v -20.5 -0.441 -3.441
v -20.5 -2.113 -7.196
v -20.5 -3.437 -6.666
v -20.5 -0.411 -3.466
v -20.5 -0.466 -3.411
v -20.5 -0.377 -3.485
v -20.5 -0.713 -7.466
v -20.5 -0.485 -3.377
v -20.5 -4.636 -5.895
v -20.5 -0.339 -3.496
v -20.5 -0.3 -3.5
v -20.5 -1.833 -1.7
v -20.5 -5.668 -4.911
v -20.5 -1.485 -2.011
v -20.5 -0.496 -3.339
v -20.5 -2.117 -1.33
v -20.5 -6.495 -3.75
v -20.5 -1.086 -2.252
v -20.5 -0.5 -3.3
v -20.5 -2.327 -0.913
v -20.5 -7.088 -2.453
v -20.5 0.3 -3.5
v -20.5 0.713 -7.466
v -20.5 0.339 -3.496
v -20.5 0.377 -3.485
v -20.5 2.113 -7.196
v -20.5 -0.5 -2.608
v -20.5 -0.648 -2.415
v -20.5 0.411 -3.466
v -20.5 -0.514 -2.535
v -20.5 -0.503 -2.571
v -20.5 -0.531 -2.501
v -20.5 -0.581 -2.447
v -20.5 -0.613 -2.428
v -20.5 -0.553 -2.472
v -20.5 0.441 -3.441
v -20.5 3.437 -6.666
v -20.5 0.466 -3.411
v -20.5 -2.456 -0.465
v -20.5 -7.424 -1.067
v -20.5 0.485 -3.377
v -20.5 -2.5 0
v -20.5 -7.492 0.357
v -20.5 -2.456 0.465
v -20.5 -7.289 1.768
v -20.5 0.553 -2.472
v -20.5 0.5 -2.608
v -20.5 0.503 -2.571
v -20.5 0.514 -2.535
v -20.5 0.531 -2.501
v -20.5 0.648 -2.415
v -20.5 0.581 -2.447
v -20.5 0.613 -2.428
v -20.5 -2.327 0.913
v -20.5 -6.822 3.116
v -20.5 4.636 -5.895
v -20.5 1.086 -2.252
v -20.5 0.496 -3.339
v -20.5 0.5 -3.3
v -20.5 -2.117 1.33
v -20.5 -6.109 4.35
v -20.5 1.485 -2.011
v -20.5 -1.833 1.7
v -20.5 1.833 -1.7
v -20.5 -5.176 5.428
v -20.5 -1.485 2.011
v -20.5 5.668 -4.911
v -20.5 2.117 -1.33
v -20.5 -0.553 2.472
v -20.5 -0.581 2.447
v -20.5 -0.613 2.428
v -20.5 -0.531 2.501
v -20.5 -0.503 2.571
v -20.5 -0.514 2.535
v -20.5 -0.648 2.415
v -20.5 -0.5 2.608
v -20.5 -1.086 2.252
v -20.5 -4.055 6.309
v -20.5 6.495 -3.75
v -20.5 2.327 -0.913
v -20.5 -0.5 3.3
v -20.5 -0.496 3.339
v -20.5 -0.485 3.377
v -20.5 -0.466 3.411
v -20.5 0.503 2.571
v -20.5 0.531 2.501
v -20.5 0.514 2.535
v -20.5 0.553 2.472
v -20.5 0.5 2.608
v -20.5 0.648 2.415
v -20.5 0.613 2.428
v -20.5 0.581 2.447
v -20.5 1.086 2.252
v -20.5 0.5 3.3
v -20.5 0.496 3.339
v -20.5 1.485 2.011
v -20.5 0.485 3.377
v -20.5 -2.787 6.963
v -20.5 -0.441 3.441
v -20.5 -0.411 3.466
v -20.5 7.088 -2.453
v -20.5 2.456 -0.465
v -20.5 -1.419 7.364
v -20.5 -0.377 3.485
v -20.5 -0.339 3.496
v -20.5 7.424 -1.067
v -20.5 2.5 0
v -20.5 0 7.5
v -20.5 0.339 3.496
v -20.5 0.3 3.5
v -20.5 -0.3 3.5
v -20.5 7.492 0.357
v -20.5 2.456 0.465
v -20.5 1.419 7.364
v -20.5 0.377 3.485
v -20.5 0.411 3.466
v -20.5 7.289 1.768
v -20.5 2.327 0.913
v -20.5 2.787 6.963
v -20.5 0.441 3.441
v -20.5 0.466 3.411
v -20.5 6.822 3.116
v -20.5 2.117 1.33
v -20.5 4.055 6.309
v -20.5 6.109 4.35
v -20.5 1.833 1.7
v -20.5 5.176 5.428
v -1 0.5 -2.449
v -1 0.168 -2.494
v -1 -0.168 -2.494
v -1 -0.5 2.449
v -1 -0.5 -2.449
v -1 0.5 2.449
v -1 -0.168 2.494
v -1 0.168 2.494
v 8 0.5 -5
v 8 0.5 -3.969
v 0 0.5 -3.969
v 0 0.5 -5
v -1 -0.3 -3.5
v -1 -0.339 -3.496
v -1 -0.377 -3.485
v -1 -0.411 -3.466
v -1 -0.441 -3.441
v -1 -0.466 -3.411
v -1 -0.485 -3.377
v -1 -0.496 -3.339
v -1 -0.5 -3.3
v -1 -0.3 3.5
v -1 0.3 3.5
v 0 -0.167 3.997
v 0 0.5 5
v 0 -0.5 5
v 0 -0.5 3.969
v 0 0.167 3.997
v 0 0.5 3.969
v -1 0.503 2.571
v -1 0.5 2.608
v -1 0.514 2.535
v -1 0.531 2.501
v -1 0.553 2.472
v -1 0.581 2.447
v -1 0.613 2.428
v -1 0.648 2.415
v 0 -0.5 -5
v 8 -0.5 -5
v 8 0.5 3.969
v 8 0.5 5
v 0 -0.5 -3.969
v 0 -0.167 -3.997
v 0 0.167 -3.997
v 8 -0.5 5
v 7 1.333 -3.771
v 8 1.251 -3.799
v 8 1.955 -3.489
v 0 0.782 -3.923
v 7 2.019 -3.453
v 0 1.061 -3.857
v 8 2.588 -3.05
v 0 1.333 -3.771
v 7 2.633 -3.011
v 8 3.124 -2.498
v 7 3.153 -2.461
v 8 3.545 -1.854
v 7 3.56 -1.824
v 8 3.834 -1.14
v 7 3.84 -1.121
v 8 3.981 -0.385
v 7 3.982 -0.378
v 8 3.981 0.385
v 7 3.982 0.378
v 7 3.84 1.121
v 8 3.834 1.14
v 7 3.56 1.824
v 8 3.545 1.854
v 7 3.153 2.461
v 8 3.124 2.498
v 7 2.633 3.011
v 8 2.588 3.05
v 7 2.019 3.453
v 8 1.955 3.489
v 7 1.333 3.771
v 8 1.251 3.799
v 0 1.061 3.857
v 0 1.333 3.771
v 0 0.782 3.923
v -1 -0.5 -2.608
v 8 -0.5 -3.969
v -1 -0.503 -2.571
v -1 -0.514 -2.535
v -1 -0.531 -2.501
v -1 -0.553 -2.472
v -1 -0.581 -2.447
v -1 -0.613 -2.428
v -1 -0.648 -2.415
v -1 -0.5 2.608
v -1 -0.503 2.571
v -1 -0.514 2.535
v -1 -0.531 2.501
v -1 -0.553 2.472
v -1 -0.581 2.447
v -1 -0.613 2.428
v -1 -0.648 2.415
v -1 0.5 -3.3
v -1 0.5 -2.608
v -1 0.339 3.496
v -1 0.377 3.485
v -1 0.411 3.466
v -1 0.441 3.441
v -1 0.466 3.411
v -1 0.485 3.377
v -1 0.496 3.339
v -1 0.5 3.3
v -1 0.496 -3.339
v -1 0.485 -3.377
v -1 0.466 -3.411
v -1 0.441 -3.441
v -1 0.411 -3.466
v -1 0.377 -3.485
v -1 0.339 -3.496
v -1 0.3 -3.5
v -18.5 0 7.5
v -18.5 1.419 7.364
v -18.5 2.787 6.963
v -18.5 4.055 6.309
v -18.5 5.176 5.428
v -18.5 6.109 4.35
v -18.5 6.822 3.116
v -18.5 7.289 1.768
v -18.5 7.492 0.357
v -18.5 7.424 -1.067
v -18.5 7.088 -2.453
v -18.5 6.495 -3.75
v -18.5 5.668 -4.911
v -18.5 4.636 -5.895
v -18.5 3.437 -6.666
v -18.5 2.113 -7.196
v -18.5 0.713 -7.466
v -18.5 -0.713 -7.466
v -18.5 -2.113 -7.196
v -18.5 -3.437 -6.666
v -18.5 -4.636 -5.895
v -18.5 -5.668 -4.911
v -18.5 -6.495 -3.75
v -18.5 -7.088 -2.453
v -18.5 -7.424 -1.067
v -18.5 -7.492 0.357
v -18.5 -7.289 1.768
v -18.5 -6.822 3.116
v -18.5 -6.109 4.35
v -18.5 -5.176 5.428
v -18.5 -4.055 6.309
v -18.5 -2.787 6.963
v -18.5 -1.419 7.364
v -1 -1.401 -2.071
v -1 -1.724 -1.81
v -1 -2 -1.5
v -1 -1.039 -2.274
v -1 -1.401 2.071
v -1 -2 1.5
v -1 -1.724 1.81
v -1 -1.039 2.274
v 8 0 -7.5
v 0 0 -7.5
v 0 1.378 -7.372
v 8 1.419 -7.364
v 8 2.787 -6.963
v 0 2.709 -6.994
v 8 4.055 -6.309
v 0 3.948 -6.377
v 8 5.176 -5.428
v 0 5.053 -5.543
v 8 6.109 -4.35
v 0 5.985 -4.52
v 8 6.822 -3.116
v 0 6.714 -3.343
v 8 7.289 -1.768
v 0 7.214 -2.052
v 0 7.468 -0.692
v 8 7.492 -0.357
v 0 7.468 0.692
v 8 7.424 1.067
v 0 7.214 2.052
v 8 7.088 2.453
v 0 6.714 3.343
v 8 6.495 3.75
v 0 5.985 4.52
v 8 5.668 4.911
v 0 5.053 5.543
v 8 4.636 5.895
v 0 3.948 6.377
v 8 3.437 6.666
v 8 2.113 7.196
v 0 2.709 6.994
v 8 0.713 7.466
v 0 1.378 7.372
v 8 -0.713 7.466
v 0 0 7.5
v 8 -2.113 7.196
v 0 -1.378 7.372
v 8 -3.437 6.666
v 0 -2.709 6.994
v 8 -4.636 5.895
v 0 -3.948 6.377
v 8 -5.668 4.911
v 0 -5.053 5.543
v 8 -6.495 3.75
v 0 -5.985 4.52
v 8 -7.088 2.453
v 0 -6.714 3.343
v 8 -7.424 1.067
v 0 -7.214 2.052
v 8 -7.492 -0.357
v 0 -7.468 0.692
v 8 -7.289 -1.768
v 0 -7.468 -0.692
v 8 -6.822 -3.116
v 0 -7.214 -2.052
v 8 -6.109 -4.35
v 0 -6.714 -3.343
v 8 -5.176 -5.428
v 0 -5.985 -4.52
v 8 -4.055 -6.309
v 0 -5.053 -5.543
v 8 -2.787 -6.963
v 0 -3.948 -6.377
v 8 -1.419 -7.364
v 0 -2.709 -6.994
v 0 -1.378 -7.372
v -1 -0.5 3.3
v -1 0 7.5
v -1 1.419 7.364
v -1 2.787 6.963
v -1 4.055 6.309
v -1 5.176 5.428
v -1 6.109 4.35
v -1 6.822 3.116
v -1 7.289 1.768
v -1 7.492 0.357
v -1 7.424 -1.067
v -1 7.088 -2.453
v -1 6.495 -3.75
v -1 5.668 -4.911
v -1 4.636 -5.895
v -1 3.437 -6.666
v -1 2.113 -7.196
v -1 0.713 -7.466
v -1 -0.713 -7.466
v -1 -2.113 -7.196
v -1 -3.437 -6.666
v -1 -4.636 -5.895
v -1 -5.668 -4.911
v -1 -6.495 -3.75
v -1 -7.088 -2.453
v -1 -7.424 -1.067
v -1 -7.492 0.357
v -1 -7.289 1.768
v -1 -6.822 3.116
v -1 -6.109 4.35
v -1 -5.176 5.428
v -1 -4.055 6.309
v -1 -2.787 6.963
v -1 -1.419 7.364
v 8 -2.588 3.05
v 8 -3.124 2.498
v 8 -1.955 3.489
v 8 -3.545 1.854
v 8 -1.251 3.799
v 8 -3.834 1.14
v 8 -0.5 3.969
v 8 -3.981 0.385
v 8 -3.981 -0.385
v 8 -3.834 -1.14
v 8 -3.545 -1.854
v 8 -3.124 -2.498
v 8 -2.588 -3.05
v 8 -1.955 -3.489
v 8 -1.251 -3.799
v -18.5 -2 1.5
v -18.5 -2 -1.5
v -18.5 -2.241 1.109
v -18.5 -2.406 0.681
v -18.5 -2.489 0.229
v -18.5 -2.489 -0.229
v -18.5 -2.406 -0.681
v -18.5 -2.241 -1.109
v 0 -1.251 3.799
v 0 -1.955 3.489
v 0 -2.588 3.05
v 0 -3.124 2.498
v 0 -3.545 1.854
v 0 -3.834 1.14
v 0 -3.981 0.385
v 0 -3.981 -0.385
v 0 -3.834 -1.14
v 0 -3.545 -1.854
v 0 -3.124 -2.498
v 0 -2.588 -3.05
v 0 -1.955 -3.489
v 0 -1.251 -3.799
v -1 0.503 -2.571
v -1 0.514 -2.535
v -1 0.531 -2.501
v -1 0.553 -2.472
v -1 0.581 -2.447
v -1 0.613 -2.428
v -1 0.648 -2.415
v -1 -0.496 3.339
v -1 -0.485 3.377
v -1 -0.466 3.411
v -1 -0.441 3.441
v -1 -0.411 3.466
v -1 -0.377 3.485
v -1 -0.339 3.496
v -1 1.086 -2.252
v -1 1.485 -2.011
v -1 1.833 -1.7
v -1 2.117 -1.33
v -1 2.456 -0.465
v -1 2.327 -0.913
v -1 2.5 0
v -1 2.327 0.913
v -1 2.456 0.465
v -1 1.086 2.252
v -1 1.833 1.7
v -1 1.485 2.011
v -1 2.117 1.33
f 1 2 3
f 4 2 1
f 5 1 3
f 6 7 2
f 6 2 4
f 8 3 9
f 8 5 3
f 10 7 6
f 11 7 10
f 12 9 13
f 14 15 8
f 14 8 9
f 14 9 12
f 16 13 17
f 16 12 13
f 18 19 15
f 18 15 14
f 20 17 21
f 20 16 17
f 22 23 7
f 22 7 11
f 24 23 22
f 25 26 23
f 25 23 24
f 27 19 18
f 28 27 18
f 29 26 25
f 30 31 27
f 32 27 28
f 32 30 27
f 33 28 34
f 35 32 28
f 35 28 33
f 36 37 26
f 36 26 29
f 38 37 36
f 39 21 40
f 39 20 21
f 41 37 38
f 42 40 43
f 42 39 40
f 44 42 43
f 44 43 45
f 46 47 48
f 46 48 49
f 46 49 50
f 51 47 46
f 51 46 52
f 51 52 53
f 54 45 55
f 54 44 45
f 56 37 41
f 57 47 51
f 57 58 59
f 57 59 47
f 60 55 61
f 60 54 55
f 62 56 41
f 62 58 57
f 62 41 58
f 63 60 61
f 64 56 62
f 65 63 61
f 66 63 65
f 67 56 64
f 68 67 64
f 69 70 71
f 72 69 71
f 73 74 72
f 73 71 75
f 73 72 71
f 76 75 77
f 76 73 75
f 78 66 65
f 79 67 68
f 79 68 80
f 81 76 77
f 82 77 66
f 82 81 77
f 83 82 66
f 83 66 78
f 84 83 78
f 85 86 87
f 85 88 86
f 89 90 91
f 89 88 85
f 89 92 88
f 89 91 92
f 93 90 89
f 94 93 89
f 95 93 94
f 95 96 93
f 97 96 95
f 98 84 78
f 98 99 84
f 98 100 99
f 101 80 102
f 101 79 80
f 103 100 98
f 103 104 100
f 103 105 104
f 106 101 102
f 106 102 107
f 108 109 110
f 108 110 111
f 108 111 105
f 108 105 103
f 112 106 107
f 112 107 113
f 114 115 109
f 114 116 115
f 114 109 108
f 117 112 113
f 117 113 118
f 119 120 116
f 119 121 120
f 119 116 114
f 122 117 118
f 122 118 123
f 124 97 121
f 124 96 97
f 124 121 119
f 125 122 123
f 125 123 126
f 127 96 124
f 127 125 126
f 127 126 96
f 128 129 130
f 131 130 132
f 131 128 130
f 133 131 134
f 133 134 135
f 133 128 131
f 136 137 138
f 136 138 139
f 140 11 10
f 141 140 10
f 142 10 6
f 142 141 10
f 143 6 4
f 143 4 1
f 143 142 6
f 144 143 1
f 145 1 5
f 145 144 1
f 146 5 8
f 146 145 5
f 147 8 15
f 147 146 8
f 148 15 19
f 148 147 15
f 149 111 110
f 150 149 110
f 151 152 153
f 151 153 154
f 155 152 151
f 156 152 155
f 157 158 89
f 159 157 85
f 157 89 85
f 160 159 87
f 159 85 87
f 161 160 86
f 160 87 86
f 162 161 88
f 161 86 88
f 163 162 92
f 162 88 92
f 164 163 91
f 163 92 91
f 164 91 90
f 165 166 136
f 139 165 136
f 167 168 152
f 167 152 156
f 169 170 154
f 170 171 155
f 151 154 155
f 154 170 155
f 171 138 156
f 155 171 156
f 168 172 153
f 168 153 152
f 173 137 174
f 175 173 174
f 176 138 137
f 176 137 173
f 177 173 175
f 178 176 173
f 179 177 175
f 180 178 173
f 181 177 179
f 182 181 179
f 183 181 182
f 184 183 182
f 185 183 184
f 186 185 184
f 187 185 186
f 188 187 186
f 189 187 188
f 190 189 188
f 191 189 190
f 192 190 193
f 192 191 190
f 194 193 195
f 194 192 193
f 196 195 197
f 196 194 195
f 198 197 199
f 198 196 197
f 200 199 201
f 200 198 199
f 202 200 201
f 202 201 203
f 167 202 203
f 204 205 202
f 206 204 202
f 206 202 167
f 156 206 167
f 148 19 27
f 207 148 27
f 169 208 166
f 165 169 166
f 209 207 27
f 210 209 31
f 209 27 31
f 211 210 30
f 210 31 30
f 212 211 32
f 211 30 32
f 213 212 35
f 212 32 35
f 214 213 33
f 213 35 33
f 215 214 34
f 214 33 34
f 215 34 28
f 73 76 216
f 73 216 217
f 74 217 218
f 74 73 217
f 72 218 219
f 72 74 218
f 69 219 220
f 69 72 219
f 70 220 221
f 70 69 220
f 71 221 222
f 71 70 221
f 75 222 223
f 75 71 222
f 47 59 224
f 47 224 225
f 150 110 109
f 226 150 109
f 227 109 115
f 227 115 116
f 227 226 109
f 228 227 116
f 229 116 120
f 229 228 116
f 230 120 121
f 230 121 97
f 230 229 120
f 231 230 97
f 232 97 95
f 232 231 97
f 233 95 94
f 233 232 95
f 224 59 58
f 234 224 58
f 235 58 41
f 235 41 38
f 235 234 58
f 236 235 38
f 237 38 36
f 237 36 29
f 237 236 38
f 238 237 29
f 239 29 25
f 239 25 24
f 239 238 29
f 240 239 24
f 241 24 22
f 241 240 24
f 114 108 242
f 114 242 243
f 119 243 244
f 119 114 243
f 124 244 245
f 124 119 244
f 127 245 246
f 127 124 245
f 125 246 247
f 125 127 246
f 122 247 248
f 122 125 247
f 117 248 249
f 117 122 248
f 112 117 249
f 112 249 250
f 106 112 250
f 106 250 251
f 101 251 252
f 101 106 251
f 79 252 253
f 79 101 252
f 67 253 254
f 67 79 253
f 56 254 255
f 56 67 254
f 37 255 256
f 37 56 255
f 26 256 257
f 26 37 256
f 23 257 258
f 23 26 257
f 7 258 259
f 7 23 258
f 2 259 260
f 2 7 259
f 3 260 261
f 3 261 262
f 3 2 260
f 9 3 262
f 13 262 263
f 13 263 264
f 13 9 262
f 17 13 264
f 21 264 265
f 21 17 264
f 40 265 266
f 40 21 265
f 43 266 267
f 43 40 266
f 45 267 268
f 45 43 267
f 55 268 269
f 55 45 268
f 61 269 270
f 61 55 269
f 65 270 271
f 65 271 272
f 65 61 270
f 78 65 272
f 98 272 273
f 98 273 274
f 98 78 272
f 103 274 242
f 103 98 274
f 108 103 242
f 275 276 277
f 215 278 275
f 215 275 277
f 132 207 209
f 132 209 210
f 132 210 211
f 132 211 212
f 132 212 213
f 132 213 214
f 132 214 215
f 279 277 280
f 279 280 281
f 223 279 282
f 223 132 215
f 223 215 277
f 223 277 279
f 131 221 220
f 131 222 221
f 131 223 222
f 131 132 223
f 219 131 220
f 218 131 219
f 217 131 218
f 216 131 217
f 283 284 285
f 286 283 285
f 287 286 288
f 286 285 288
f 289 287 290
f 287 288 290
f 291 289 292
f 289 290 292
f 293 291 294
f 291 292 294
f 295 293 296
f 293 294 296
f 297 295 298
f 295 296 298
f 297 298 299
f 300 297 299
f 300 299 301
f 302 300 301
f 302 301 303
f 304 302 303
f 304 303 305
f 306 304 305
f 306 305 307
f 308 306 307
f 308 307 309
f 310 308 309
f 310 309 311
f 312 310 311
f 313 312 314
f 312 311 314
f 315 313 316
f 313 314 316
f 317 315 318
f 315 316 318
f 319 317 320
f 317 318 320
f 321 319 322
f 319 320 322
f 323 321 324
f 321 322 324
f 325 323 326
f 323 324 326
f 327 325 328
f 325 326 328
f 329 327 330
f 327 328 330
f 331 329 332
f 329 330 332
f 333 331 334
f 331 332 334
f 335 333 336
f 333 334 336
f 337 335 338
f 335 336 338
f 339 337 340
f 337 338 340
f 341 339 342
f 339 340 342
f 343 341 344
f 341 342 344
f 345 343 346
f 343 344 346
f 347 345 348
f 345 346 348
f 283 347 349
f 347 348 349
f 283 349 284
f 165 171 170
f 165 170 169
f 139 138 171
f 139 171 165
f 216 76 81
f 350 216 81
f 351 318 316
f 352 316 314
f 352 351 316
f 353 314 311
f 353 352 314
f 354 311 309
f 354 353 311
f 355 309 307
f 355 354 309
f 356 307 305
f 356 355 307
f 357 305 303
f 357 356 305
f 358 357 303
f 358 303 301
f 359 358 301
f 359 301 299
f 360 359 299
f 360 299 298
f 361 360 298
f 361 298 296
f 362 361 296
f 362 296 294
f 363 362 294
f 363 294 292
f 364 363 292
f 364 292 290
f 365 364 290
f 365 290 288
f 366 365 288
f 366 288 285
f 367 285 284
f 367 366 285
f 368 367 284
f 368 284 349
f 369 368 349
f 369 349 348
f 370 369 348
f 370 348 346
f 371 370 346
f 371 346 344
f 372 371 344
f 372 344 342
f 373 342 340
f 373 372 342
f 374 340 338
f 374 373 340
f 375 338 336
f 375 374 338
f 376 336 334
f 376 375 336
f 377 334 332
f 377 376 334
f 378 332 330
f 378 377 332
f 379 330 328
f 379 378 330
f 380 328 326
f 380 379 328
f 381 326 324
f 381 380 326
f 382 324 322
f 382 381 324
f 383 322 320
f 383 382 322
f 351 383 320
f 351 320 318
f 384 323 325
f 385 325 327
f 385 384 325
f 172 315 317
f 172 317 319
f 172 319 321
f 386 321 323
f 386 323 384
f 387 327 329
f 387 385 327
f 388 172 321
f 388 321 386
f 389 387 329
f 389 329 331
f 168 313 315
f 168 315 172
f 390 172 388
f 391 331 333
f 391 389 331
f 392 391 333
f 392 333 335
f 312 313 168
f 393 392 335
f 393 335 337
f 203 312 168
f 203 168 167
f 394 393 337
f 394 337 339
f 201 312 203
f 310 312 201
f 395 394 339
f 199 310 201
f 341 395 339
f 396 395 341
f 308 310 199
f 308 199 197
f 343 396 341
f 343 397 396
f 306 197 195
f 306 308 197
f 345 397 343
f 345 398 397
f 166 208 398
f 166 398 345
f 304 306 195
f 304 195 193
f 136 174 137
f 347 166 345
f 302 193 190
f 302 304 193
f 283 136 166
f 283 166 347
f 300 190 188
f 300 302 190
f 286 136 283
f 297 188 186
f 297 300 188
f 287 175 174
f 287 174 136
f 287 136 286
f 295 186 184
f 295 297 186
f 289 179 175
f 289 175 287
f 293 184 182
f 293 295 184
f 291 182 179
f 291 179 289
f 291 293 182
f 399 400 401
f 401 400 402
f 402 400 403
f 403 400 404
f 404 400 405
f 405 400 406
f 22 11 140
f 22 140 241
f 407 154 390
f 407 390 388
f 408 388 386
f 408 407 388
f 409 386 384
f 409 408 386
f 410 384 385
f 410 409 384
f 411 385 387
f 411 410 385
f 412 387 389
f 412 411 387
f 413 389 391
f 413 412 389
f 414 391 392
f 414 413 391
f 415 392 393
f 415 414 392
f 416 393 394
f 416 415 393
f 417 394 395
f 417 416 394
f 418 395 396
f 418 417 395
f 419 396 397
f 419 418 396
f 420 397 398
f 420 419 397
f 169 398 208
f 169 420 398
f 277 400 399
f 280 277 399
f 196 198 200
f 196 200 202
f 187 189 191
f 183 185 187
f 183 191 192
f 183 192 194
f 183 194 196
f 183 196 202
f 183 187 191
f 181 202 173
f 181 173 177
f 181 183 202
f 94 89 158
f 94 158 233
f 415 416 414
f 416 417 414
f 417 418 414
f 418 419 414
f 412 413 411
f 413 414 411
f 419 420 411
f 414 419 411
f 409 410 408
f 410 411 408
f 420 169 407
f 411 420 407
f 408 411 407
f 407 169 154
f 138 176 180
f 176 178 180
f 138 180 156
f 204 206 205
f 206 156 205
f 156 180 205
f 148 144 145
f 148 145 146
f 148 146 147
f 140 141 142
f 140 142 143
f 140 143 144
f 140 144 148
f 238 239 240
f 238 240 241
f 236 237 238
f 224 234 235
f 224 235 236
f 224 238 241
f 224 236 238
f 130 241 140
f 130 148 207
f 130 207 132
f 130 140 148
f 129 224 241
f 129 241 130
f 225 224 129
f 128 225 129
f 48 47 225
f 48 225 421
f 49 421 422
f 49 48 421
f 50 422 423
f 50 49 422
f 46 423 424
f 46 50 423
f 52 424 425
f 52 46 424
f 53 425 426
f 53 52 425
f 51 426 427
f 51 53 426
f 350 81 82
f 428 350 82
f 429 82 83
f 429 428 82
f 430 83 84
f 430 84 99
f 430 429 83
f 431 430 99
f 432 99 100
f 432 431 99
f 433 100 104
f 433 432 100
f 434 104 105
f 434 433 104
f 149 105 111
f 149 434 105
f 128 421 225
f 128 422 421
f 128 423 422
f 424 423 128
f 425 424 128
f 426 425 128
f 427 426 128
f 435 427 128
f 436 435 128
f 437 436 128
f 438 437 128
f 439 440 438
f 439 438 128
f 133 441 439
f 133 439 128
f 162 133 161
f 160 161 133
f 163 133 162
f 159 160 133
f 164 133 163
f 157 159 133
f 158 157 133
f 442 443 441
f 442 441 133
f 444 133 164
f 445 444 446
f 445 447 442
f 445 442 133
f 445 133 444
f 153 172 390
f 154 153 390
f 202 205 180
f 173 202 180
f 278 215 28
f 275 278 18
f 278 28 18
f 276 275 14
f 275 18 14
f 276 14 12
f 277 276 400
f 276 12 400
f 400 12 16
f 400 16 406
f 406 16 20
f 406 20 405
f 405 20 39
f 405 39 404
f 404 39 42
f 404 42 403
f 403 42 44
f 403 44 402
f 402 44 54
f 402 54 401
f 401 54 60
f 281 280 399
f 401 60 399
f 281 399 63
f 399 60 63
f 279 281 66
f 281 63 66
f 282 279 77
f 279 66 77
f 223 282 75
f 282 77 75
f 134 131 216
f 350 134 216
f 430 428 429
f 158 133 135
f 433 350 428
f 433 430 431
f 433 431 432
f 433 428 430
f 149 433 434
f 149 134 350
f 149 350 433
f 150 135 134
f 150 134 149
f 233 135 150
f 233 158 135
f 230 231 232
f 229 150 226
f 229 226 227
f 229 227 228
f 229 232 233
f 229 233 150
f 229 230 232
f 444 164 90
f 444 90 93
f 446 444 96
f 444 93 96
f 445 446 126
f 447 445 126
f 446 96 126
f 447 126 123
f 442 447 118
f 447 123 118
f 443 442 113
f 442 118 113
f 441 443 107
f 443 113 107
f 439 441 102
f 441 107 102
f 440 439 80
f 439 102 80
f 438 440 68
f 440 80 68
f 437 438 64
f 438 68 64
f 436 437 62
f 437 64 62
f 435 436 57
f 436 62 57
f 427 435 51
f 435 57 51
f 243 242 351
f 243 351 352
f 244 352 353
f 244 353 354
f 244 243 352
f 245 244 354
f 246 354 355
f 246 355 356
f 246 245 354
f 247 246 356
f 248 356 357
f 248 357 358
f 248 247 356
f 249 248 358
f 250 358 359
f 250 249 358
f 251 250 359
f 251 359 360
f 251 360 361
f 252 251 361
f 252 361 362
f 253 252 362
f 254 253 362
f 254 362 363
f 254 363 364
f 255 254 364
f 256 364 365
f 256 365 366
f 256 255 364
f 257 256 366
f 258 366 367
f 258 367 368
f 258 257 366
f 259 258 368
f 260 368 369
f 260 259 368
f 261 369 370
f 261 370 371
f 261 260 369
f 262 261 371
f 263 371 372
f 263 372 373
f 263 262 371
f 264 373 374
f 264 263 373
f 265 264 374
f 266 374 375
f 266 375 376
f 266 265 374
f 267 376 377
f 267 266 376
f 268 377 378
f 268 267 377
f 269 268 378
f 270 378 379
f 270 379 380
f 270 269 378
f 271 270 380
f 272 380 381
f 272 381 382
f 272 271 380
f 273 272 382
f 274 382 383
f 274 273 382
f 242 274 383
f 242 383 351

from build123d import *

# Parameters (mm, degrees)
SKETCH1_R           = 7.5
SKETCH1_R_2         = 4
BOSS_EXTRUDE1_DEPTH = 8
BOSS_EXTRUDE2_START = 1
SKETCH2_R           = 7.5
BOSS_EXTRUDE2_DEPTH = 1
BOSS_EXTRUDE3_DEPTH = 7
BOSS_EXTRUDE4_START = 17.5
SKETCH4_R           = 7.5
BOSS_EXTRUDE4_DEPTH = 17.5
BOSS_EXTRUDE5_START = 2
SKETCH5_R           = 7.5
SKETCH5_R_2         = 2.5
BOSS_EXTRUDE5_DEPTH = 2
SKETCH6_W           = 7
SKETCH6_H           = 1
CUT_EXTRUDE1_DEPTH  = 19.5
FILLET1_R           = 0.2
SKETCH7_W           = 10
SKETCH7_H           = 1
CUT_EXTRUDE2_DEPTH  = 8


with BuildPart() as part:
    # Sketch1 → Boss-Extrude1 (new body)
    with BuildSketch(Plane(origin=(0, 0, 0), x_dir=(0, 0, -1), z_dir=(1, 0, 0))):
        Circle(SKETCH1_R)
        Circle(SKETCH1_R_2, mode=Mode.SUBTRACT)
    extrude(amount=BOSS_EXTRUDE1_DEPTH)

    # Sketch2 → Boss-Extrude2 (add)
    with BuildSketch(Plane.ZY.offset(BOSS_EXTRUDE2_START)):
        Circle(SKETCH2_R)
    extrude(amount=-BOSS_EXTRUDE2_DEPTH)

    # Sketch3 → Boss-Extrude3 (add)
    with BuildSketch(Plane(origin=(0, 0, 0), x_dir=(0, 0, -1), z_dir=(1, 0, 0))):
        with BuildLine():
            Line((-3.771236166, 1.333333333), (3.771236166, 1.333333333))
            ThreePointArc((3.771236166, 1.333333333), (0, 4), (-3.771236166, 1.333333333))
        make_face()
    extrude(amount=BOSS_EXTRUDE3_DEPTH)

    # Sketch4 → Boss-Extrude4 (add)
    with BuildSketch(Plane.ZY.offset(1).offset(BOSS_EXTRUDE4_START)):
        Circle(SKETCH4_R)
        with BuildLine():
            ThreePointArc((1.5, -2), (0, 2.5), (-1.5, -2))
            Line((-1.5, -2), (1.5, -2))
        make_face(mode=Mode.SUBTRACT)
    extrude(amount=-BOSS_EXTRUDE4_DEPTH)

    # Sketch5 → Boss-Extrude5 (add)
    with BuildSketch(Plane.ZY.offset(18.5).offset(BOSS_EXTRUDE5_START)):
        Circle(SKETCH5_R)
        with Locations(Location((0, 0, 0), (0, 0, 233.130102354))):
            Circle(SKETCH5_R_2, mode=Mode.SUBTRACT)
    extrude(amount=-BOSS_EXTRUDE5_DEPTH)

    # Sketch6 → Cut-Extrude1 (cut)
    with BuildSketch(Plane.ZY.offset(20.5)):
        Rectangle(SKETCH6_W, SKETCH6_H)
    extrude(amount=-CUT_EXTRUDE1_DEPTH, mode=Mode.SUBTRACT)

    # Fillet1
    fillet1_edges = [part.edges().sort_by_distance(p)[0] for p in [
        (-9.75, 0.5, -2.449489743),
        (-9.75, 0.5, 2.449489743),
        (-9.75, -0.5, 2.449489743),
        (-9.75, -0.5, -2.449489743),
        (-10.75, 0.5, 3.5),
        (-10.75, -0.5, 3.5),
        (-10.75, -0.5, -3.5),
        (-10.75, 0.5, -3.5),
    ]]
    fillet(fillet1_edges, radius=FILLET1_R)

    # Sketch7 → Cut-Extrude2 (cut)
    with BuildSketch(Plane(origin=(8, 0, 0), x_dir=(0, 0, -1), z_dir=(1, 0, 0))):
        Rectangle(SKETCH7_W, SKETCH7_H)
    extrude(amount=-CUT_EXTRUDE2_DEPTH, mode=Mode.SUBTRACT)


solid = part.part
